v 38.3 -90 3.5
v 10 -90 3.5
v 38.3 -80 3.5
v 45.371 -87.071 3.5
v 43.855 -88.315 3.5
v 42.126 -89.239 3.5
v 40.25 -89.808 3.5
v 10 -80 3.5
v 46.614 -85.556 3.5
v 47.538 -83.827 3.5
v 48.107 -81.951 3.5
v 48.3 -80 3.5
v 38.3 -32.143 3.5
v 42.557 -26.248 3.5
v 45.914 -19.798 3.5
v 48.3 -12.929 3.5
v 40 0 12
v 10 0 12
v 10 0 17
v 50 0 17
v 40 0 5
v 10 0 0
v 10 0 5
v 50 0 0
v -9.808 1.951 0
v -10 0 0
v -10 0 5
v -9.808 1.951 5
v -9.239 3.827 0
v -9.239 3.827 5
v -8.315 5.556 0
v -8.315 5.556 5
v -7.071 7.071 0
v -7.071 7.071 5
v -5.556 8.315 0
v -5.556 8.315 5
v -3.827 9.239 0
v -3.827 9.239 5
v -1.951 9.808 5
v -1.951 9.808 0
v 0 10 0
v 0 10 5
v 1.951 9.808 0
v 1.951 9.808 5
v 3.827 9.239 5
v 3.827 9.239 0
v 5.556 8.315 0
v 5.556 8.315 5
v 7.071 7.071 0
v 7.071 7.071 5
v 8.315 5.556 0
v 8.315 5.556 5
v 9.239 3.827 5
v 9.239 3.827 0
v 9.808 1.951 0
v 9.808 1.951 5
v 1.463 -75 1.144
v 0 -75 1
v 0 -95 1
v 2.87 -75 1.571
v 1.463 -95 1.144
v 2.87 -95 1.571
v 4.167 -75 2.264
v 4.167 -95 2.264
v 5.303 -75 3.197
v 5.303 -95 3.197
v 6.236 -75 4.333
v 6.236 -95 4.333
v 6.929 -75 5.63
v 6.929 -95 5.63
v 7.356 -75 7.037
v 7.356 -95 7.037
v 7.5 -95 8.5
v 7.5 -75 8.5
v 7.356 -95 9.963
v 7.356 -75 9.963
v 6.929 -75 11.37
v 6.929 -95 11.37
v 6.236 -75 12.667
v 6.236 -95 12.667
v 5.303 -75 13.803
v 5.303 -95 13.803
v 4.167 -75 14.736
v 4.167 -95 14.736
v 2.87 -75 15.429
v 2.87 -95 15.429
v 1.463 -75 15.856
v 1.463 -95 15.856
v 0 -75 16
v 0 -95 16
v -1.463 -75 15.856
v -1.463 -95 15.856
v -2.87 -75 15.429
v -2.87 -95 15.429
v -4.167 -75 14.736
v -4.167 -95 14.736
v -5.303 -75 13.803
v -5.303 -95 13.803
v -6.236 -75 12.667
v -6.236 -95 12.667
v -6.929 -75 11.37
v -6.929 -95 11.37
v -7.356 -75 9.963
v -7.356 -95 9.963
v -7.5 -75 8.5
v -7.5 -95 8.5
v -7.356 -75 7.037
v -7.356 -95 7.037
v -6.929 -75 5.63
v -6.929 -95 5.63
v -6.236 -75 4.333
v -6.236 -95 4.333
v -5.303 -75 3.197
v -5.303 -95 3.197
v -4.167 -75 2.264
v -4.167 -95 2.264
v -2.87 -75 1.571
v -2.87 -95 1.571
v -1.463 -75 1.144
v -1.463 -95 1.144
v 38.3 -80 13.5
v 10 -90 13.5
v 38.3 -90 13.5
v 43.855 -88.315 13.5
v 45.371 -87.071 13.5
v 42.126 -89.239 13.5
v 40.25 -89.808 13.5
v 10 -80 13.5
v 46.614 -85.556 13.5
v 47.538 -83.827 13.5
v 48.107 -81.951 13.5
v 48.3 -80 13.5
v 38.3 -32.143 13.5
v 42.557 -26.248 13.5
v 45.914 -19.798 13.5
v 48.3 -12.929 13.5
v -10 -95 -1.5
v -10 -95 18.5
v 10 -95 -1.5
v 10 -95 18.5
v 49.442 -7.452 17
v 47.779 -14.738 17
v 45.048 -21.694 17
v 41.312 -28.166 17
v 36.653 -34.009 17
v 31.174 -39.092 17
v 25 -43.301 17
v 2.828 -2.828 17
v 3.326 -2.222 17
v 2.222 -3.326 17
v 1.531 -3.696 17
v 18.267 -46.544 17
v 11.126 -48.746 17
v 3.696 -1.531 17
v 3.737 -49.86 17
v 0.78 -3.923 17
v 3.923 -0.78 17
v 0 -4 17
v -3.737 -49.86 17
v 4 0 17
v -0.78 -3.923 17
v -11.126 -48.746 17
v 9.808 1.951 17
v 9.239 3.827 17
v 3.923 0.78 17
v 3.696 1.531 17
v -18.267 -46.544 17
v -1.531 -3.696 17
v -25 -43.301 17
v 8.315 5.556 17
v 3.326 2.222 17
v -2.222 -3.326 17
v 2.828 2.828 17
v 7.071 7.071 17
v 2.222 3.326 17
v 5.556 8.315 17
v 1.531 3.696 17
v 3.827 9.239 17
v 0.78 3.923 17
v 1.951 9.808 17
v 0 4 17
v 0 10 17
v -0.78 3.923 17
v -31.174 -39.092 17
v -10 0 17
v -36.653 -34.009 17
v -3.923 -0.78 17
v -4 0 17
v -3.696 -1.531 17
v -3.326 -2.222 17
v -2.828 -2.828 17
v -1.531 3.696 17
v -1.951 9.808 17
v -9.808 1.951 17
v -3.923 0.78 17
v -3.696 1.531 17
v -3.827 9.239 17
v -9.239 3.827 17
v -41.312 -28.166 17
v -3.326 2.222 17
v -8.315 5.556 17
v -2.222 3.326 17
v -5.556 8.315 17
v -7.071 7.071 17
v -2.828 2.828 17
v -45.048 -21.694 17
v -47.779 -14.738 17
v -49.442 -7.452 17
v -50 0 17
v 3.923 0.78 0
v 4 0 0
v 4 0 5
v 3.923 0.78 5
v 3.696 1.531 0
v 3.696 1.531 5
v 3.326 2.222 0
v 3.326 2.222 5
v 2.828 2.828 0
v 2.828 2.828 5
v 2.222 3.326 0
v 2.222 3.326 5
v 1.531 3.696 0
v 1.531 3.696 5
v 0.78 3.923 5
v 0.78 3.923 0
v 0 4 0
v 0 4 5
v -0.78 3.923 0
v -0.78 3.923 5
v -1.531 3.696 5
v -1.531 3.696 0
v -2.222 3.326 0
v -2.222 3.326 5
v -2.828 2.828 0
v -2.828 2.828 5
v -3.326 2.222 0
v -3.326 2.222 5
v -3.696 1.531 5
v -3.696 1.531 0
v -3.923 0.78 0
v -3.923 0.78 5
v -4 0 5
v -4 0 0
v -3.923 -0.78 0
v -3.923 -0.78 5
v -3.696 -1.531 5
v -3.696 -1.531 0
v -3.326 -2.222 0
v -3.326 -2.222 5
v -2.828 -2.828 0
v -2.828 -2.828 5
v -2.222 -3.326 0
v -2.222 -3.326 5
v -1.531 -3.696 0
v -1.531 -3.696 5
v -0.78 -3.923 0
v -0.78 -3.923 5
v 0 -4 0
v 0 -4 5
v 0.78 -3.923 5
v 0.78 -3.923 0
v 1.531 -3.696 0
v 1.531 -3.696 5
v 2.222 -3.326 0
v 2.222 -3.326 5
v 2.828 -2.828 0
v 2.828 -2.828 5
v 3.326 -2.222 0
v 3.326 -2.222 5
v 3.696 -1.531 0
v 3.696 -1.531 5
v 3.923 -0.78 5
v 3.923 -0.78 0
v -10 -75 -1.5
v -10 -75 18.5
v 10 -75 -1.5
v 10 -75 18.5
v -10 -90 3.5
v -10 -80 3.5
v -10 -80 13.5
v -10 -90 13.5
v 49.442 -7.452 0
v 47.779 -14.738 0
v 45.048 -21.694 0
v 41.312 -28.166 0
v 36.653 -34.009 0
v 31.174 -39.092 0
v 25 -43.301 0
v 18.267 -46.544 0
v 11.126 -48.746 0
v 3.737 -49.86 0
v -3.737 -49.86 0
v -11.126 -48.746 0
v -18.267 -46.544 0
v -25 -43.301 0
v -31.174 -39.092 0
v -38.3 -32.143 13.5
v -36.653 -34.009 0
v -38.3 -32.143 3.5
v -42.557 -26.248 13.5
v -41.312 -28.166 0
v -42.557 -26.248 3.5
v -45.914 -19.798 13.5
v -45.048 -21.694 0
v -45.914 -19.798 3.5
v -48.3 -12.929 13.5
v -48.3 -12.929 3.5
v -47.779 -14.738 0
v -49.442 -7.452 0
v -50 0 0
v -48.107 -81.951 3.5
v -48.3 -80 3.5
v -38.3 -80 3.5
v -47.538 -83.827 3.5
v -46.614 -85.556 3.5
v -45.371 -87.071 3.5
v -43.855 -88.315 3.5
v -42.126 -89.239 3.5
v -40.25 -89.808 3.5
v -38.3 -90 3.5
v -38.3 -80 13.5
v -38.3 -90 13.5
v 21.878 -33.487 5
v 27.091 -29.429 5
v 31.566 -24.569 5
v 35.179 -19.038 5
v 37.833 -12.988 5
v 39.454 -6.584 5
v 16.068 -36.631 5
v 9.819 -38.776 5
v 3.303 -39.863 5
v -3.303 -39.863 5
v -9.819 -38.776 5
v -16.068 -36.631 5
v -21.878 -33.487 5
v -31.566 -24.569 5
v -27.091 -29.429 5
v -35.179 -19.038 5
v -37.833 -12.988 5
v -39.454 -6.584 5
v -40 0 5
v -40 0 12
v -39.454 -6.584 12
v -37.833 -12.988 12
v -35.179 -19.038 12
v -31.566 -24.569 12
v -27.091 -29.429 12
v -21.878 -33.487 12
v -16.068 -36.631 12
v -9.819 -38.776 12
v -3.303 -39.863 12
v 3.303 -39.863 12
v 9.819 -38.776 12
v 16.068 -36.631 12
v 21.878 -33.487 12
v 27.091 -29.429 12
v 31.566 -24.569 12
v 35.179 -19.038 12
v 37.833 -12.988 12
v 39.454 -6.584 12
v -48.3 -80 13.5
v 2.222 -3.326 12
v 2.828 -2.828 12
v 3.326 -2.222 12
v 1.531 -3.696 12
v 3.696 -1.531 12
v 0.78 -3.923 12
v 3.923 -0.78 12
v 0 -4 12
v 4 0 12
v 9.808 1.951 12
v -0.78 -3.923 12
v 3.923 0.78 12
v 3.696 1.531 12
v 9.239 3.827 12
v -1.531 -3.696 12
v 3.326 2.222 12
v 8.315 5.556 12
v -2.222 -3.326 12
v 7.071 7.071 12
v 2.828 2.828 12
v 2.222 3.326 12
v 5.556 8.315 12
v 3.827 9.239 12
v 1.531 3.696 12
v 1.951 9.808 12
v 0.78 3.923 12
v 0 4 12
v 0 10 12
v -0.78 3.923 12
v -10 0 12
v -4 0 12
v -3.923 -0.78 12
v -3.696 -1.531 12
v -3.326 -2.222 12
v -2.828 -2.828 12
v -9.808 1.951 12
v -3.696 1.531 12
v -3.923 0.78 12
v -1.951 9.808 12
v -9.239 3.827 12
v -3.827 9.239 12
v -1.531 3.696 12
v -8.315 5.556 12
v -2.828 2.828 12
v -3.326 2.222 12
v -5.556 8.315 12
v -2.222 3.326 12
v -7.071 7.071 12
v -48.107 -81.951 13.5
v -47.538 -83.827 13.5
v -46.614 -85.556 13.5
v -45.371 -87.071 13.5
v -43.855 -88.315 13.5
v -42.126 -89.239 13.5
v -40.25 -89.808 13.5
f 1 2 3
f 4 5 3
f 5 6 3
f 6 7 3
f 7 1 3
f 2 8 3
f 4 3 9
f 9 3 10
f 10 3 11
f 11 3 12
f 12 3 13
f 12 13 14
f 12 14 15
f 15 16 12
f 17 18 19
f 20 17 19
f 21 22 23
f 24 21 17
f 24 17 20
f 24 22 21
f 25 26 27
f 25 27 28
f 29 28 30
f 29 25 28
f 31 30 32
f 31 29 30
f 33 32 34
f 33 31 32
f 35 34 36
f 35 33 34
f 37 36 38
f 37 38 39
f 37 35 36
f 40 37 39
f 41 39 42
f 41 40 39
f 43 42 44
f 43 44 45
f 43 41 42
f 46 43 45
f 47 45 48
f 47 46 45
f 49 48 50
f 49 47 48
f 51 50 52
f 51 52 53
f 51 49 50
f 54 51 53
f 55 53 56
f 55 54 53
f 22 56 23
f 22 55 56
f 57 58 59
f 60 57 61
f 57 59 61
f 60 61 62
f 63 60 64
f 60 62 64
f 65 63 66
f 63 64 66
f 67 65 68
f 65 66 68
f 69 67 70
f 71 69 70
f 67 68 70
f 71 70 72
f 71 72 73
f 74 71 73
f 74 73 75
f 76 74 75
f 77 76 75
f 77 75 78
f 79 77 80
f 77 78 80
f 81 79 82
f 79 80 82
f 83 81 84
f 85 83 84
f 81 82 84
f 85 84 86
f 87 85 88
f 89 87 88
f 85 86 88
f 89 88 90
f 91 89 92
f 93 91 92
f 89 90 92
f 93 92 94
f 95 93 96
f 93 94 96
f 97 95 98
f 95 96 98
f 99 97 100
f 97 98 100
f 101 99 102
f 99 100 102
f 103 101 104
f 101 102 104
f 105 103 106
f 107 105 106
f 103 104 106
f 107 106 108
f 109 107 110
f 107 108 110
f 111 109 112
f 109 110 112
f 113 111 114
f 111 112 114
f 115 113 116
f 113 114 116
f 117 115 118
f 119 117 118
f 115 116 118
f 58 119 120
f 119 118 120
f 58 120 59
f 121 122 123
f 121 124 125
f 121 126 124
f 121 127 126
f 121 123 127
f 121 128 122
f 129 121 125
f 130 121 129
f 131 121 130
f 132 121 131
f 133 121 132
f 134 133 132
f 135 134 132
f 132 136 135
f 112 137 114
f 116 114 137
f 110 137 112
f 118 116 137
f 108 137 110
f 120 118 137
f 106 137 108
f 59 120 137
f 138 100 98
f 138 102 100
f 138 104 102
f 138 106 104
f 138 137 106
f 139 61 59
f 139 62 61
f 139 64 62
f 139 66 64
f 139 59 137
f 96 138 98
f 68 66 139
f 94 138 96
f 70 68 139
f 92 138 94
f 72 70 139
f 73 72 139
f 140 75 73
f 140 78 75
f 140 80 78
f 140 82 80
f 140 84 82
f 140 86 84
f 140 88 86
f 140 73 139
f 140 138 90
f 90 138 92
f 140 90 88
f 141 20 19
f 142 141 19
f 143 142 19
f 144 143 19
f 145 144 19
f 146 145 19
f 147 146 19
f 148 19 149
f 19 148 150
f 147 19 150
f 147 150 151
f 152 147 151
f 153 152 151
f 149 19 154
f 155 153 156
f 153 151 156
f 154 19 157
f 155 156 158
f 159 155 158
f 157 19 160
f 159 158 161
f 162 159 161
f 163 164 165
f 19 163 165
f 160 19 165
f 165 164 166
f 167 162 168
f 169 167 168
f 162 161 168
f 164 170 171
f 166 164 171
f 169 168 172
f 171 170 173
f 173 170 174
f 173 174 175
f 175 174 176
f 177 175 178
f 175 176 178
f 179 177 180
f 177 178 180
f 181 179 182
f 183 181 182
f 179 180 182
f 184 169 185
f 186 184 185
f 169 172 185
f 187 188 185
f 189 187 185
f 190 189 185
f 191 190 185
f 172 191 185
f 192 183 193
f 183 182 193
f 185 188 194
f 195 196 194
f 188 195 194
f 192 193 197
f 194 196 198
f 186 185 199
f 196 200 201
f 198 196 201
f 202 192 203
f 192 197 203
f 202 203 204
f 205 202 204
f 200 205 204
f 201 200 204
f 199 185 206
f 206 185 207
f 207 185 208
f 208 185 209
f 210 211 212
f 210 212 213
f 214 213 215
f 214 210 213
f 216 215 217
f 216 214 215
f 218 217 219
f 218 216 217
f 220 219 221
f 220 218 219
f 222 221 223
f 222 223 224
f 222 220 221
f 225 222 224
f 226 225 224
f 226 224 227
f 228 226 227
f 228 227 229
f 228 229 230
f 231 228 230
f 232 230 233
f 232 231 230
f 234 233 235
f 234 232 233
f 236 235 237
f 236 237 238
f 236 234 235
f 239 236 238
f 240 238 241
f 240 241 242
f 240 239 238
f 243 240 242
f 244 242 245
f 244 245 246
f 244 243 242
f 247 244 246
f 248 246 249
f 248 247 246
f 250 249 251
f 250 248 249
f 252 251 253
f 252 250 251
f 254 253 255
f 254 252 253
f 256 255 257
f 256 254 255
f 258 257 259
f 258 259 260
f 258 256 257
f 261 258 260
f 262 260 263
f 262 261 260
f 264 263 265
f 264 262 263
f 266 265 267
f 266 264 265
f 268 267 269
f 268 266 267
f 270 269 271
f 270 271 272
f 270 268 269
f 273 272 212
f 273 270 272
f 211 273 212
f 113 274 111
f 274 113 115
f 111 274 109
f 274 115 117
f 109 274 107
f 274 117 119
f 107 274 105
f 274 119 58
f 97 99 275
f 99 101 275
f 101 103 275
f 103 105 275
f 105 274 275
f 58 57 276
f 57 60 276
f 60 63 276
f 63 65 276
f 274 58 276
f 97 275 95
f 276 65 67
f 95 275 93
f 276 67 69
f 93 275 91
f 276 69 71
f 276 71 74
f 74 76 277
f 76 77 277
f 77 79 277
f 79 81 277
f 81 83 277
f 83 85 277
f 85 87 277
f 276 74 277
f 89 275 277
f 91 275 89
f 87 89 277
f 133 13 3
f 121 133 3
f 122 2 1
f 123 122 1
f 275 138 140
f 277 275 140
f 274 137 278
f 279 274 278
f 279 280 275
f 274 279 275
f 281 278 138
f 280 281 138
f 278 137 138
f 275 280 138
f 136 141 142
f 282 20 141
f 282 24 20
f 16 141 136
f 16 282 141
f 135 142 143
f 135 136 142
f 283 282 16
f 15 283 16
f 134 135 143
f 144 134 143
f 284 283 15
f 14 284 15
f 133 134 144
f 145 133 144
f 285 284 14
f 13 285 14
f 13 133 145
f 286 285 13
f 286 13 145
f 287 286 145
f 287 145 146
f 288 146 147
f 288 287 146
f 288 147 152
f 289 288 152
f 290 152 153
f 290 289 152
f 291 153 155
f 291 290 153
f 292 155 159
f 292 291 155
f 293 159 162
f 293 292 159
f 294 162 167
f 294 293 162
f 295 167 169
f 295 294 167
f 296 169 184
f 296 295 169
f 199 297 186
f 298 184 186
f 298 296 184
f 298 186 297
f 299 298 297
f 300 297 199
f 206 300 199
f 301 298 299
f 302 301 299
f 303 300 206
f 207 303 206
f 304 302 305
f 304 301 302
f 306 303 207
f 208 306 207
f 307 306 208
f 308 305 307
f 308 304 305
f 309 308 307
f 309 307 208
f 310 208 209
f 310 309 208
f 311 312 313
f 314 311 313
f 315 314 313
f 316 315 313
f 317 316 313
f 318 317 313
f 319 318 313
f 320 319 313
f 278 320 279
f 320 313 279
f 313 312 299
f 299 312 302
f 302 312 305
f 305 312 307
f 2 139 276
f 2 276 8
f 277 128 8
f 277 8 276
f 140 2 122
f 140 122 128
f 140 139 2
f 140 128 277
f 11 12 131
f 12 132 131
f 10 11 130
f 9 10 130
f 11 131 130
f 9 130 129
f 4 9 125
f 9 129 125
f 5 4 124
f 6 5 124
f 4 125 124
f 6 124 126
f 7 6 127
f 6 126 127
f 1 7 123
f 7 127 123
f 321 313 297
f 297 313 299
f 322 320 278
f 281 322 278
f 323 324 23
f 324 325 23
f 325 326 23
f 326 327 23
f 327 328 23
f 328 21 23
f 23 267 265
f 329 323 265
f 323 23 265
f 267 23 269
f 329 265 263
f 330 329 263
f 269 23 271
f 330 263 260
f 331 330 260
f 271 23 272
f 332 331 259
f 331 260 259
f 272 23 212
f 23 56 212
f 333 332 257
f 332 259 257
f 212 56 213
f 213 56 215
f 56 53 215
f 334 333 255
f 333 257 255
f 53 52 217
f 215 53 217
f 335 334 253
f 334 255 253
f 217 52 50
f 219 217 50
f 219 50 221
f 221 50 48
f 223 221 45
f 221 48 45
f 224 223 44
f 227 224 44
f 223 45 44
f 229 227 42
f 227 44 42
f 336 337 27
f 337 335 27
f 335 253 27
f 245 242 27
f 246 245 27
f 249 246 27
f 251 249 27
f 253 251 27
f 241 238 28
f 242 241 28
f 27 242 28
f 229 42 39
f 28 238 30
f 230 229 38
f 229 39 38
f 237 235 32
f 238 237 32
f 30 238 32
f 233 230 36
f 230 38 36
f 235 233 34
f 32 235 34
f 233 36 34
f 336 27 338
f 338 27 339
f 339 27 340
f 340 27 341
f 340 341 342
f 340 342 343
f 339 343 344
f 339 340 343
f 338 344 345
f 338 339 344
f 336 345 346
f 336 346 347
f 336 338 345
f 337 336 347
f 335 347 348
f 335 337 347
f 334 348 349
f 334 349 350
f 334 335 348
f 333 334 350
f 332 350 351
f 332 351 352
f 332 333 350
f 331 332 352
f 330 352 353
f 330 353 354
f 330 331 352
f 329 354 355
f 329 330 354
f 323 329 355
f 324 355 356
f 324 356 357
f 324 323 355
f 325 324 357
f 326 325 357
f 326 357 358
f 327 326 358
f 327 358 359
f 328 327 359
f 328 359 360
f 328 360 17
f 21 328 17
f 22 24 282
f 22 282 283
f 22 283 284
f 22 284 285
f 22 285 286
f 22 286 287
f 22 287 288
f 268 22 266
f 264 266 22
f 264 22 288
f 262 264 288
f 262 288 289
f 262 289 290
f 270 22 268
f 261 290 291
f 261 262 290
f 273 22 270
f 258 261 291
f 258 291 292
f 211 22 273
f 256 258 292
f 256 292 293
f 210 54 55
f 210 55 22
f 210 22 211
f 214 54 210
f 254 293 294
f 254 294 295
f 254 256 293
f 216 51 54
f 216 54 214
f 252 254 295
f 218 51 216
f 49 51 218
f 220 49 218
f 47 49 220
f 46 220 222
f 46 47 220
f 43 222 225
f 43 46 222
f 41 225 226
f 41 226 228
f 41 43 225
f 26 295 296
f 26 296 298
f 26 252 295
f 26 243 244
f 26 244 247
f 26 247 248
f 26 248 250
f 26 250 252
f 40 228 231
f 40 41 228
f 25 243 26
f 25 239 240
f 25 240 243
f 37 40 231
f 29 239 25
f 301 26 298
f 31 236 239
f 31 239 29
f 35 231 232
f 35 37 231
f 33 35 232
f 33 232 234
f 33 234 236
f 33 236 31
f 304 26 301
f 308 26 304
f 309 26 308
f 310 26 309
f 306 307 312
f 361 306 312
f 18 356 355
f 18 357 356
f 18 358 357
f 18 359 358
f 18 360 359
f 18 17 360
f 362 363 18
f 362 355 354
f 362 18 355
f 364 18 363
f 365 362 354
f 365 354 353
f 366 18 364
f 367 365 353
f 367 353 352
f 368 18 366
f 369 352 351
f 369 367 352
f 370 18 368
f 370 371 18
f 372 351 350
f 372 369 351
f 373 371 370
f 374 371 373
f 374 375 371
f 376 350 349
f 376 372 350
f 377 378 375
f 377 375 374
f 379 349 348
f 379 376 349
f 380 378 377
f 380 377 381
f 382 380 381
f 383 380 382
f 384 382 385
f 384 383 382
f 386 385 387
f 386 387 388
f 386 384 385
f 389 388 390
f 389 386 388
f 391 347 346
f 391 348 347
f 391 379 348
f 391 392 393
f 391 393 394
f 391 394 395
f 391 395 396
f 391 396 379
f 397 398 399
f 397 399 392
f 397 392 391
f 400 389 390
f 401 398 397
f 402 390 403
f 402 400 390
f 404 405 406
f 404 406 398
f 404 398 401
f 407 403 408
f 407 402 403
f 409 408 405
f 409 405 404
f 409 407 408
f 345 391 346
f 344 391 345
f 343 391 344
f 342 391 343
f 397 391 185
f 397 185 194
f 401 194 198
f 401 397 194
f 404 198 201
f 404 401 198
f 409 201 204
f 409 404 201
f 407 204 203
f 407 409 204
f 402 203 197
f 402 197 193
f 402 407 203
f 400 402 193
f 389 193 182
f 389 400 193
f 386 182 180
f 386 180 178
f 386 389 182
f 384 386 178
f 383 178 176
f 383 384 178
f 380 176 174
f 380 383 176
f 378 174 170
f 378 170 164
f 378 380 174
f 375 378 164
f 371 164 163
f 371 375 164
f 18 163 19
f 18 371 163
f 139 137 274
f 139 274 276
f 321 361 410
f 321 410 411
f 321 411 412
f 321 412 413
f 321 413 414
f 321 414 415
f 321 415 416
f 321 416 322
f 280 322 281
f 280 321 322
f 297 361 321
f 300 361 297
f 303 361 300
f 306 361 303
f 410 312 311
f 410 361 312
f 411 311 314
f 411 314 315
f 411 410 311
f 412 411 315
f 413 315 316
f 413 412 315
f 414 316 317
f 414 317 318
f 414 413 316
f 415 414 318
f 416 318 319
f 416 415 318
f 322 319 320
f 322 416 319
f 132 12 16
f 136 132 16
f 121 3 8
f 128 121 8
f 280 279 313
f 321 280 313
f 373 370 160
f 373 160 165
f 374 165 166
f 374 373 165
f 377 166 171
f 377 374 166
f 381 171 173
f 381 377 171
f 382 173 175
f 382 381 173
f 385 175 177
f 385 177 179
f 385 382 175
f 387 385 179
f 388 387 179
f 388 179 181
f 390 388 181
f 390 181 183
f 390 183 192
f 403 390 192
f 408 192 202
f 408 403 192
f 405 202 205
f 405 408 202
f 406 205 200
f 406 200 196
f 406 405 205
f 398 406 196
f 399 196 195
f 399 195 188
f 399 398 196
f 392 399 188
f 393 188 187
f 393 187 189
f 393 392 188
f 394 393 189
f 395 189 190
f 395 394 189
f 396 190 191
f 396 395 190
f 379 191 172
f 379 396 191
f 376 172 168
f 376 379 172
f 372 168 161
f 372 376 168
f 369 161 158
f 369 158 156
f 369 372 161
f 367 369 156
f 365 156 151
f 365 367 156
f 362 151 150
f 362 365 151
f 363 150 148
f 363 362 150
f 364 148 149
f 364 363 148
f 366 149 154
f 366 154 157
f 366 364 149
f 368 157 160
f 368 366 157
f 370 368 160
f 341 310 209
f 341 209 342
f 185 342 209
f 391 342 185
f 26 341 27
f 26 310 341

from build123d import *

# Parameters (mm, degrees)
SKETCH1_R           = 4
BOSS_EXTRUDE1_DEPTH = 5
BOSS_EXTRUDE2_DEPTH = 7
SKETCH3_R           = 4
BOSS_EXTRUDE3_DEPTH = 5
BOSS_EXTRUDE4_START = -13.5
BOSS_EXTRUDE4_DEPTH = 10
FILLET1_R           = 10
SKETCH7_W           = 20
SKETCH7_H           = 20
BOSS_EXTRUDE6_DEPTH = 20
SKETCH8_R           = 7.5
CUT_EXTRUDE2_DEPTH  = 20


with BuildPart() as part:
    # Sketch1 → Boss-Extrude1 (new body)
    with BuildSketch(Plane.XY):
        with BuildLine():
            Line((-50, 0), (-10, 0))
            ThreePointArc((-10, 0), (0, 10), (10, 0))
            Line((10, 0), (50, 0))
            ThreePointArc((50, 0), (0, -50), (-50, 0))
        make_face()
        Circle(SKETCH1_R, mode=Mode.SUBTRACT)
    extrude(amount=BOSS_EXTRUDE1_DEPTH)

    # Sketch2 → Boss-Extrude2 (add)
    with BuildSketch(Plane.XY.offset(5)):
        with BuildLine():
            Line((-50, 0), (-40, 0))
            ThreePointArc((-40, 0), (0, -40), (40, 0))
            Line((40, 0), (50, 0))
            ThreePointArc((50, 0), (0, -50), (-50, 0))
        make_face()
    extrude(amount=BOSS_EXTRUDE2_DEPTH)

    # Sketch3 → Boss-Extrude3 (add)
    with BuildSketch(Plane.XY.offset(12)):
        with BuildLine():
            Line((-50, 0), (-10, 0))
            ThreePointArc((-10, 0), (0, 10), (10, 0))
            Line((10, 0), (50, 0))
            ThreePointArc((50, 0), (0, -50), (-50, 0))
        make_face()
        Circle(SKETCH3_R, mode=Mode.SUBTRACT)
    extrude(amount=BOSS_EXTRUDE3_DEPTH)

    # Sketch4 → Boss-Extrude4 (add)
    with BuildSketch(Plane.XY.offset(17).offset(BOSS_EXTRUDE4_START)):
        with BuildLine():
            Line((-10, -95), (10, -95))
            Line((10, -95), (10, -90))
            Line((10, -90), (48.299537742, -90))
            Line((48.299537742, -90), (48.299537742, -12.928830338))
            ThreePointArc((48.299537742, -12.928830338), (44.35247464, -23.08371706), (38.299537742, -32.142579373))
            Line((38.299537742, -32.142579373), (38.299537742, -80))
            Line((38.299537742, -80), (10, -80))
            Line((10, -80), (10, -75))
            Line((10, -75), (-10, -75))
            Line((-10, -75), (-10, -80))
            Line((-10, -80), (-38.299537742, -80))
            Line((-38.299537742, -80), (-38.299537742, -32.142579373))
            ThreePointArc((-38.299537742, -32.142579373), (-44.35247464, -23.08371706), (-48.299537742, -12.928830338))
            Line((-48.299537742, -12.928830338), (-48.299537742, -90))
            Line((-48.299537742, -90), (-10, -90))
            Line((-10, -90), (-10, -95))
        make_face()
    extrude(amount=BOSS_EXTRUDE4_DEPTH)

    # Fillet1
    fillet1_edges = [part.edges().sort_by_distance(p)[0] for p in [
        (48.299537742, -90, 8.5),
        (-48.299537742, -90, 8.5),
    ]]
    fillet(fillet1_edges, radius=FILLET1_R)

    # Sketch7 → Boss-Extrude6 (add)
    with BuildSketch(Plane.XZ.offset(95)):
        with Locations((0, 8.5)):
            Rectangle(SKETCH7_W, SKETCH7_H)
    extrude(amount=-BOSS_EXTRUDE6_DEPTH)

    # Sketch8 → Cut-Extrude2 (cut)
    with BuildSketch(Plane.XZ.offset(95)):
        with Locations(Location((0, 8.5, 0), (0, 0, 270))):
            Circle(SKETCH8_R)
    extrude(amount=-CUT_EXTRUDE2_DEPTH, mode=Mode.SUBTRACT)


solid = part.part
